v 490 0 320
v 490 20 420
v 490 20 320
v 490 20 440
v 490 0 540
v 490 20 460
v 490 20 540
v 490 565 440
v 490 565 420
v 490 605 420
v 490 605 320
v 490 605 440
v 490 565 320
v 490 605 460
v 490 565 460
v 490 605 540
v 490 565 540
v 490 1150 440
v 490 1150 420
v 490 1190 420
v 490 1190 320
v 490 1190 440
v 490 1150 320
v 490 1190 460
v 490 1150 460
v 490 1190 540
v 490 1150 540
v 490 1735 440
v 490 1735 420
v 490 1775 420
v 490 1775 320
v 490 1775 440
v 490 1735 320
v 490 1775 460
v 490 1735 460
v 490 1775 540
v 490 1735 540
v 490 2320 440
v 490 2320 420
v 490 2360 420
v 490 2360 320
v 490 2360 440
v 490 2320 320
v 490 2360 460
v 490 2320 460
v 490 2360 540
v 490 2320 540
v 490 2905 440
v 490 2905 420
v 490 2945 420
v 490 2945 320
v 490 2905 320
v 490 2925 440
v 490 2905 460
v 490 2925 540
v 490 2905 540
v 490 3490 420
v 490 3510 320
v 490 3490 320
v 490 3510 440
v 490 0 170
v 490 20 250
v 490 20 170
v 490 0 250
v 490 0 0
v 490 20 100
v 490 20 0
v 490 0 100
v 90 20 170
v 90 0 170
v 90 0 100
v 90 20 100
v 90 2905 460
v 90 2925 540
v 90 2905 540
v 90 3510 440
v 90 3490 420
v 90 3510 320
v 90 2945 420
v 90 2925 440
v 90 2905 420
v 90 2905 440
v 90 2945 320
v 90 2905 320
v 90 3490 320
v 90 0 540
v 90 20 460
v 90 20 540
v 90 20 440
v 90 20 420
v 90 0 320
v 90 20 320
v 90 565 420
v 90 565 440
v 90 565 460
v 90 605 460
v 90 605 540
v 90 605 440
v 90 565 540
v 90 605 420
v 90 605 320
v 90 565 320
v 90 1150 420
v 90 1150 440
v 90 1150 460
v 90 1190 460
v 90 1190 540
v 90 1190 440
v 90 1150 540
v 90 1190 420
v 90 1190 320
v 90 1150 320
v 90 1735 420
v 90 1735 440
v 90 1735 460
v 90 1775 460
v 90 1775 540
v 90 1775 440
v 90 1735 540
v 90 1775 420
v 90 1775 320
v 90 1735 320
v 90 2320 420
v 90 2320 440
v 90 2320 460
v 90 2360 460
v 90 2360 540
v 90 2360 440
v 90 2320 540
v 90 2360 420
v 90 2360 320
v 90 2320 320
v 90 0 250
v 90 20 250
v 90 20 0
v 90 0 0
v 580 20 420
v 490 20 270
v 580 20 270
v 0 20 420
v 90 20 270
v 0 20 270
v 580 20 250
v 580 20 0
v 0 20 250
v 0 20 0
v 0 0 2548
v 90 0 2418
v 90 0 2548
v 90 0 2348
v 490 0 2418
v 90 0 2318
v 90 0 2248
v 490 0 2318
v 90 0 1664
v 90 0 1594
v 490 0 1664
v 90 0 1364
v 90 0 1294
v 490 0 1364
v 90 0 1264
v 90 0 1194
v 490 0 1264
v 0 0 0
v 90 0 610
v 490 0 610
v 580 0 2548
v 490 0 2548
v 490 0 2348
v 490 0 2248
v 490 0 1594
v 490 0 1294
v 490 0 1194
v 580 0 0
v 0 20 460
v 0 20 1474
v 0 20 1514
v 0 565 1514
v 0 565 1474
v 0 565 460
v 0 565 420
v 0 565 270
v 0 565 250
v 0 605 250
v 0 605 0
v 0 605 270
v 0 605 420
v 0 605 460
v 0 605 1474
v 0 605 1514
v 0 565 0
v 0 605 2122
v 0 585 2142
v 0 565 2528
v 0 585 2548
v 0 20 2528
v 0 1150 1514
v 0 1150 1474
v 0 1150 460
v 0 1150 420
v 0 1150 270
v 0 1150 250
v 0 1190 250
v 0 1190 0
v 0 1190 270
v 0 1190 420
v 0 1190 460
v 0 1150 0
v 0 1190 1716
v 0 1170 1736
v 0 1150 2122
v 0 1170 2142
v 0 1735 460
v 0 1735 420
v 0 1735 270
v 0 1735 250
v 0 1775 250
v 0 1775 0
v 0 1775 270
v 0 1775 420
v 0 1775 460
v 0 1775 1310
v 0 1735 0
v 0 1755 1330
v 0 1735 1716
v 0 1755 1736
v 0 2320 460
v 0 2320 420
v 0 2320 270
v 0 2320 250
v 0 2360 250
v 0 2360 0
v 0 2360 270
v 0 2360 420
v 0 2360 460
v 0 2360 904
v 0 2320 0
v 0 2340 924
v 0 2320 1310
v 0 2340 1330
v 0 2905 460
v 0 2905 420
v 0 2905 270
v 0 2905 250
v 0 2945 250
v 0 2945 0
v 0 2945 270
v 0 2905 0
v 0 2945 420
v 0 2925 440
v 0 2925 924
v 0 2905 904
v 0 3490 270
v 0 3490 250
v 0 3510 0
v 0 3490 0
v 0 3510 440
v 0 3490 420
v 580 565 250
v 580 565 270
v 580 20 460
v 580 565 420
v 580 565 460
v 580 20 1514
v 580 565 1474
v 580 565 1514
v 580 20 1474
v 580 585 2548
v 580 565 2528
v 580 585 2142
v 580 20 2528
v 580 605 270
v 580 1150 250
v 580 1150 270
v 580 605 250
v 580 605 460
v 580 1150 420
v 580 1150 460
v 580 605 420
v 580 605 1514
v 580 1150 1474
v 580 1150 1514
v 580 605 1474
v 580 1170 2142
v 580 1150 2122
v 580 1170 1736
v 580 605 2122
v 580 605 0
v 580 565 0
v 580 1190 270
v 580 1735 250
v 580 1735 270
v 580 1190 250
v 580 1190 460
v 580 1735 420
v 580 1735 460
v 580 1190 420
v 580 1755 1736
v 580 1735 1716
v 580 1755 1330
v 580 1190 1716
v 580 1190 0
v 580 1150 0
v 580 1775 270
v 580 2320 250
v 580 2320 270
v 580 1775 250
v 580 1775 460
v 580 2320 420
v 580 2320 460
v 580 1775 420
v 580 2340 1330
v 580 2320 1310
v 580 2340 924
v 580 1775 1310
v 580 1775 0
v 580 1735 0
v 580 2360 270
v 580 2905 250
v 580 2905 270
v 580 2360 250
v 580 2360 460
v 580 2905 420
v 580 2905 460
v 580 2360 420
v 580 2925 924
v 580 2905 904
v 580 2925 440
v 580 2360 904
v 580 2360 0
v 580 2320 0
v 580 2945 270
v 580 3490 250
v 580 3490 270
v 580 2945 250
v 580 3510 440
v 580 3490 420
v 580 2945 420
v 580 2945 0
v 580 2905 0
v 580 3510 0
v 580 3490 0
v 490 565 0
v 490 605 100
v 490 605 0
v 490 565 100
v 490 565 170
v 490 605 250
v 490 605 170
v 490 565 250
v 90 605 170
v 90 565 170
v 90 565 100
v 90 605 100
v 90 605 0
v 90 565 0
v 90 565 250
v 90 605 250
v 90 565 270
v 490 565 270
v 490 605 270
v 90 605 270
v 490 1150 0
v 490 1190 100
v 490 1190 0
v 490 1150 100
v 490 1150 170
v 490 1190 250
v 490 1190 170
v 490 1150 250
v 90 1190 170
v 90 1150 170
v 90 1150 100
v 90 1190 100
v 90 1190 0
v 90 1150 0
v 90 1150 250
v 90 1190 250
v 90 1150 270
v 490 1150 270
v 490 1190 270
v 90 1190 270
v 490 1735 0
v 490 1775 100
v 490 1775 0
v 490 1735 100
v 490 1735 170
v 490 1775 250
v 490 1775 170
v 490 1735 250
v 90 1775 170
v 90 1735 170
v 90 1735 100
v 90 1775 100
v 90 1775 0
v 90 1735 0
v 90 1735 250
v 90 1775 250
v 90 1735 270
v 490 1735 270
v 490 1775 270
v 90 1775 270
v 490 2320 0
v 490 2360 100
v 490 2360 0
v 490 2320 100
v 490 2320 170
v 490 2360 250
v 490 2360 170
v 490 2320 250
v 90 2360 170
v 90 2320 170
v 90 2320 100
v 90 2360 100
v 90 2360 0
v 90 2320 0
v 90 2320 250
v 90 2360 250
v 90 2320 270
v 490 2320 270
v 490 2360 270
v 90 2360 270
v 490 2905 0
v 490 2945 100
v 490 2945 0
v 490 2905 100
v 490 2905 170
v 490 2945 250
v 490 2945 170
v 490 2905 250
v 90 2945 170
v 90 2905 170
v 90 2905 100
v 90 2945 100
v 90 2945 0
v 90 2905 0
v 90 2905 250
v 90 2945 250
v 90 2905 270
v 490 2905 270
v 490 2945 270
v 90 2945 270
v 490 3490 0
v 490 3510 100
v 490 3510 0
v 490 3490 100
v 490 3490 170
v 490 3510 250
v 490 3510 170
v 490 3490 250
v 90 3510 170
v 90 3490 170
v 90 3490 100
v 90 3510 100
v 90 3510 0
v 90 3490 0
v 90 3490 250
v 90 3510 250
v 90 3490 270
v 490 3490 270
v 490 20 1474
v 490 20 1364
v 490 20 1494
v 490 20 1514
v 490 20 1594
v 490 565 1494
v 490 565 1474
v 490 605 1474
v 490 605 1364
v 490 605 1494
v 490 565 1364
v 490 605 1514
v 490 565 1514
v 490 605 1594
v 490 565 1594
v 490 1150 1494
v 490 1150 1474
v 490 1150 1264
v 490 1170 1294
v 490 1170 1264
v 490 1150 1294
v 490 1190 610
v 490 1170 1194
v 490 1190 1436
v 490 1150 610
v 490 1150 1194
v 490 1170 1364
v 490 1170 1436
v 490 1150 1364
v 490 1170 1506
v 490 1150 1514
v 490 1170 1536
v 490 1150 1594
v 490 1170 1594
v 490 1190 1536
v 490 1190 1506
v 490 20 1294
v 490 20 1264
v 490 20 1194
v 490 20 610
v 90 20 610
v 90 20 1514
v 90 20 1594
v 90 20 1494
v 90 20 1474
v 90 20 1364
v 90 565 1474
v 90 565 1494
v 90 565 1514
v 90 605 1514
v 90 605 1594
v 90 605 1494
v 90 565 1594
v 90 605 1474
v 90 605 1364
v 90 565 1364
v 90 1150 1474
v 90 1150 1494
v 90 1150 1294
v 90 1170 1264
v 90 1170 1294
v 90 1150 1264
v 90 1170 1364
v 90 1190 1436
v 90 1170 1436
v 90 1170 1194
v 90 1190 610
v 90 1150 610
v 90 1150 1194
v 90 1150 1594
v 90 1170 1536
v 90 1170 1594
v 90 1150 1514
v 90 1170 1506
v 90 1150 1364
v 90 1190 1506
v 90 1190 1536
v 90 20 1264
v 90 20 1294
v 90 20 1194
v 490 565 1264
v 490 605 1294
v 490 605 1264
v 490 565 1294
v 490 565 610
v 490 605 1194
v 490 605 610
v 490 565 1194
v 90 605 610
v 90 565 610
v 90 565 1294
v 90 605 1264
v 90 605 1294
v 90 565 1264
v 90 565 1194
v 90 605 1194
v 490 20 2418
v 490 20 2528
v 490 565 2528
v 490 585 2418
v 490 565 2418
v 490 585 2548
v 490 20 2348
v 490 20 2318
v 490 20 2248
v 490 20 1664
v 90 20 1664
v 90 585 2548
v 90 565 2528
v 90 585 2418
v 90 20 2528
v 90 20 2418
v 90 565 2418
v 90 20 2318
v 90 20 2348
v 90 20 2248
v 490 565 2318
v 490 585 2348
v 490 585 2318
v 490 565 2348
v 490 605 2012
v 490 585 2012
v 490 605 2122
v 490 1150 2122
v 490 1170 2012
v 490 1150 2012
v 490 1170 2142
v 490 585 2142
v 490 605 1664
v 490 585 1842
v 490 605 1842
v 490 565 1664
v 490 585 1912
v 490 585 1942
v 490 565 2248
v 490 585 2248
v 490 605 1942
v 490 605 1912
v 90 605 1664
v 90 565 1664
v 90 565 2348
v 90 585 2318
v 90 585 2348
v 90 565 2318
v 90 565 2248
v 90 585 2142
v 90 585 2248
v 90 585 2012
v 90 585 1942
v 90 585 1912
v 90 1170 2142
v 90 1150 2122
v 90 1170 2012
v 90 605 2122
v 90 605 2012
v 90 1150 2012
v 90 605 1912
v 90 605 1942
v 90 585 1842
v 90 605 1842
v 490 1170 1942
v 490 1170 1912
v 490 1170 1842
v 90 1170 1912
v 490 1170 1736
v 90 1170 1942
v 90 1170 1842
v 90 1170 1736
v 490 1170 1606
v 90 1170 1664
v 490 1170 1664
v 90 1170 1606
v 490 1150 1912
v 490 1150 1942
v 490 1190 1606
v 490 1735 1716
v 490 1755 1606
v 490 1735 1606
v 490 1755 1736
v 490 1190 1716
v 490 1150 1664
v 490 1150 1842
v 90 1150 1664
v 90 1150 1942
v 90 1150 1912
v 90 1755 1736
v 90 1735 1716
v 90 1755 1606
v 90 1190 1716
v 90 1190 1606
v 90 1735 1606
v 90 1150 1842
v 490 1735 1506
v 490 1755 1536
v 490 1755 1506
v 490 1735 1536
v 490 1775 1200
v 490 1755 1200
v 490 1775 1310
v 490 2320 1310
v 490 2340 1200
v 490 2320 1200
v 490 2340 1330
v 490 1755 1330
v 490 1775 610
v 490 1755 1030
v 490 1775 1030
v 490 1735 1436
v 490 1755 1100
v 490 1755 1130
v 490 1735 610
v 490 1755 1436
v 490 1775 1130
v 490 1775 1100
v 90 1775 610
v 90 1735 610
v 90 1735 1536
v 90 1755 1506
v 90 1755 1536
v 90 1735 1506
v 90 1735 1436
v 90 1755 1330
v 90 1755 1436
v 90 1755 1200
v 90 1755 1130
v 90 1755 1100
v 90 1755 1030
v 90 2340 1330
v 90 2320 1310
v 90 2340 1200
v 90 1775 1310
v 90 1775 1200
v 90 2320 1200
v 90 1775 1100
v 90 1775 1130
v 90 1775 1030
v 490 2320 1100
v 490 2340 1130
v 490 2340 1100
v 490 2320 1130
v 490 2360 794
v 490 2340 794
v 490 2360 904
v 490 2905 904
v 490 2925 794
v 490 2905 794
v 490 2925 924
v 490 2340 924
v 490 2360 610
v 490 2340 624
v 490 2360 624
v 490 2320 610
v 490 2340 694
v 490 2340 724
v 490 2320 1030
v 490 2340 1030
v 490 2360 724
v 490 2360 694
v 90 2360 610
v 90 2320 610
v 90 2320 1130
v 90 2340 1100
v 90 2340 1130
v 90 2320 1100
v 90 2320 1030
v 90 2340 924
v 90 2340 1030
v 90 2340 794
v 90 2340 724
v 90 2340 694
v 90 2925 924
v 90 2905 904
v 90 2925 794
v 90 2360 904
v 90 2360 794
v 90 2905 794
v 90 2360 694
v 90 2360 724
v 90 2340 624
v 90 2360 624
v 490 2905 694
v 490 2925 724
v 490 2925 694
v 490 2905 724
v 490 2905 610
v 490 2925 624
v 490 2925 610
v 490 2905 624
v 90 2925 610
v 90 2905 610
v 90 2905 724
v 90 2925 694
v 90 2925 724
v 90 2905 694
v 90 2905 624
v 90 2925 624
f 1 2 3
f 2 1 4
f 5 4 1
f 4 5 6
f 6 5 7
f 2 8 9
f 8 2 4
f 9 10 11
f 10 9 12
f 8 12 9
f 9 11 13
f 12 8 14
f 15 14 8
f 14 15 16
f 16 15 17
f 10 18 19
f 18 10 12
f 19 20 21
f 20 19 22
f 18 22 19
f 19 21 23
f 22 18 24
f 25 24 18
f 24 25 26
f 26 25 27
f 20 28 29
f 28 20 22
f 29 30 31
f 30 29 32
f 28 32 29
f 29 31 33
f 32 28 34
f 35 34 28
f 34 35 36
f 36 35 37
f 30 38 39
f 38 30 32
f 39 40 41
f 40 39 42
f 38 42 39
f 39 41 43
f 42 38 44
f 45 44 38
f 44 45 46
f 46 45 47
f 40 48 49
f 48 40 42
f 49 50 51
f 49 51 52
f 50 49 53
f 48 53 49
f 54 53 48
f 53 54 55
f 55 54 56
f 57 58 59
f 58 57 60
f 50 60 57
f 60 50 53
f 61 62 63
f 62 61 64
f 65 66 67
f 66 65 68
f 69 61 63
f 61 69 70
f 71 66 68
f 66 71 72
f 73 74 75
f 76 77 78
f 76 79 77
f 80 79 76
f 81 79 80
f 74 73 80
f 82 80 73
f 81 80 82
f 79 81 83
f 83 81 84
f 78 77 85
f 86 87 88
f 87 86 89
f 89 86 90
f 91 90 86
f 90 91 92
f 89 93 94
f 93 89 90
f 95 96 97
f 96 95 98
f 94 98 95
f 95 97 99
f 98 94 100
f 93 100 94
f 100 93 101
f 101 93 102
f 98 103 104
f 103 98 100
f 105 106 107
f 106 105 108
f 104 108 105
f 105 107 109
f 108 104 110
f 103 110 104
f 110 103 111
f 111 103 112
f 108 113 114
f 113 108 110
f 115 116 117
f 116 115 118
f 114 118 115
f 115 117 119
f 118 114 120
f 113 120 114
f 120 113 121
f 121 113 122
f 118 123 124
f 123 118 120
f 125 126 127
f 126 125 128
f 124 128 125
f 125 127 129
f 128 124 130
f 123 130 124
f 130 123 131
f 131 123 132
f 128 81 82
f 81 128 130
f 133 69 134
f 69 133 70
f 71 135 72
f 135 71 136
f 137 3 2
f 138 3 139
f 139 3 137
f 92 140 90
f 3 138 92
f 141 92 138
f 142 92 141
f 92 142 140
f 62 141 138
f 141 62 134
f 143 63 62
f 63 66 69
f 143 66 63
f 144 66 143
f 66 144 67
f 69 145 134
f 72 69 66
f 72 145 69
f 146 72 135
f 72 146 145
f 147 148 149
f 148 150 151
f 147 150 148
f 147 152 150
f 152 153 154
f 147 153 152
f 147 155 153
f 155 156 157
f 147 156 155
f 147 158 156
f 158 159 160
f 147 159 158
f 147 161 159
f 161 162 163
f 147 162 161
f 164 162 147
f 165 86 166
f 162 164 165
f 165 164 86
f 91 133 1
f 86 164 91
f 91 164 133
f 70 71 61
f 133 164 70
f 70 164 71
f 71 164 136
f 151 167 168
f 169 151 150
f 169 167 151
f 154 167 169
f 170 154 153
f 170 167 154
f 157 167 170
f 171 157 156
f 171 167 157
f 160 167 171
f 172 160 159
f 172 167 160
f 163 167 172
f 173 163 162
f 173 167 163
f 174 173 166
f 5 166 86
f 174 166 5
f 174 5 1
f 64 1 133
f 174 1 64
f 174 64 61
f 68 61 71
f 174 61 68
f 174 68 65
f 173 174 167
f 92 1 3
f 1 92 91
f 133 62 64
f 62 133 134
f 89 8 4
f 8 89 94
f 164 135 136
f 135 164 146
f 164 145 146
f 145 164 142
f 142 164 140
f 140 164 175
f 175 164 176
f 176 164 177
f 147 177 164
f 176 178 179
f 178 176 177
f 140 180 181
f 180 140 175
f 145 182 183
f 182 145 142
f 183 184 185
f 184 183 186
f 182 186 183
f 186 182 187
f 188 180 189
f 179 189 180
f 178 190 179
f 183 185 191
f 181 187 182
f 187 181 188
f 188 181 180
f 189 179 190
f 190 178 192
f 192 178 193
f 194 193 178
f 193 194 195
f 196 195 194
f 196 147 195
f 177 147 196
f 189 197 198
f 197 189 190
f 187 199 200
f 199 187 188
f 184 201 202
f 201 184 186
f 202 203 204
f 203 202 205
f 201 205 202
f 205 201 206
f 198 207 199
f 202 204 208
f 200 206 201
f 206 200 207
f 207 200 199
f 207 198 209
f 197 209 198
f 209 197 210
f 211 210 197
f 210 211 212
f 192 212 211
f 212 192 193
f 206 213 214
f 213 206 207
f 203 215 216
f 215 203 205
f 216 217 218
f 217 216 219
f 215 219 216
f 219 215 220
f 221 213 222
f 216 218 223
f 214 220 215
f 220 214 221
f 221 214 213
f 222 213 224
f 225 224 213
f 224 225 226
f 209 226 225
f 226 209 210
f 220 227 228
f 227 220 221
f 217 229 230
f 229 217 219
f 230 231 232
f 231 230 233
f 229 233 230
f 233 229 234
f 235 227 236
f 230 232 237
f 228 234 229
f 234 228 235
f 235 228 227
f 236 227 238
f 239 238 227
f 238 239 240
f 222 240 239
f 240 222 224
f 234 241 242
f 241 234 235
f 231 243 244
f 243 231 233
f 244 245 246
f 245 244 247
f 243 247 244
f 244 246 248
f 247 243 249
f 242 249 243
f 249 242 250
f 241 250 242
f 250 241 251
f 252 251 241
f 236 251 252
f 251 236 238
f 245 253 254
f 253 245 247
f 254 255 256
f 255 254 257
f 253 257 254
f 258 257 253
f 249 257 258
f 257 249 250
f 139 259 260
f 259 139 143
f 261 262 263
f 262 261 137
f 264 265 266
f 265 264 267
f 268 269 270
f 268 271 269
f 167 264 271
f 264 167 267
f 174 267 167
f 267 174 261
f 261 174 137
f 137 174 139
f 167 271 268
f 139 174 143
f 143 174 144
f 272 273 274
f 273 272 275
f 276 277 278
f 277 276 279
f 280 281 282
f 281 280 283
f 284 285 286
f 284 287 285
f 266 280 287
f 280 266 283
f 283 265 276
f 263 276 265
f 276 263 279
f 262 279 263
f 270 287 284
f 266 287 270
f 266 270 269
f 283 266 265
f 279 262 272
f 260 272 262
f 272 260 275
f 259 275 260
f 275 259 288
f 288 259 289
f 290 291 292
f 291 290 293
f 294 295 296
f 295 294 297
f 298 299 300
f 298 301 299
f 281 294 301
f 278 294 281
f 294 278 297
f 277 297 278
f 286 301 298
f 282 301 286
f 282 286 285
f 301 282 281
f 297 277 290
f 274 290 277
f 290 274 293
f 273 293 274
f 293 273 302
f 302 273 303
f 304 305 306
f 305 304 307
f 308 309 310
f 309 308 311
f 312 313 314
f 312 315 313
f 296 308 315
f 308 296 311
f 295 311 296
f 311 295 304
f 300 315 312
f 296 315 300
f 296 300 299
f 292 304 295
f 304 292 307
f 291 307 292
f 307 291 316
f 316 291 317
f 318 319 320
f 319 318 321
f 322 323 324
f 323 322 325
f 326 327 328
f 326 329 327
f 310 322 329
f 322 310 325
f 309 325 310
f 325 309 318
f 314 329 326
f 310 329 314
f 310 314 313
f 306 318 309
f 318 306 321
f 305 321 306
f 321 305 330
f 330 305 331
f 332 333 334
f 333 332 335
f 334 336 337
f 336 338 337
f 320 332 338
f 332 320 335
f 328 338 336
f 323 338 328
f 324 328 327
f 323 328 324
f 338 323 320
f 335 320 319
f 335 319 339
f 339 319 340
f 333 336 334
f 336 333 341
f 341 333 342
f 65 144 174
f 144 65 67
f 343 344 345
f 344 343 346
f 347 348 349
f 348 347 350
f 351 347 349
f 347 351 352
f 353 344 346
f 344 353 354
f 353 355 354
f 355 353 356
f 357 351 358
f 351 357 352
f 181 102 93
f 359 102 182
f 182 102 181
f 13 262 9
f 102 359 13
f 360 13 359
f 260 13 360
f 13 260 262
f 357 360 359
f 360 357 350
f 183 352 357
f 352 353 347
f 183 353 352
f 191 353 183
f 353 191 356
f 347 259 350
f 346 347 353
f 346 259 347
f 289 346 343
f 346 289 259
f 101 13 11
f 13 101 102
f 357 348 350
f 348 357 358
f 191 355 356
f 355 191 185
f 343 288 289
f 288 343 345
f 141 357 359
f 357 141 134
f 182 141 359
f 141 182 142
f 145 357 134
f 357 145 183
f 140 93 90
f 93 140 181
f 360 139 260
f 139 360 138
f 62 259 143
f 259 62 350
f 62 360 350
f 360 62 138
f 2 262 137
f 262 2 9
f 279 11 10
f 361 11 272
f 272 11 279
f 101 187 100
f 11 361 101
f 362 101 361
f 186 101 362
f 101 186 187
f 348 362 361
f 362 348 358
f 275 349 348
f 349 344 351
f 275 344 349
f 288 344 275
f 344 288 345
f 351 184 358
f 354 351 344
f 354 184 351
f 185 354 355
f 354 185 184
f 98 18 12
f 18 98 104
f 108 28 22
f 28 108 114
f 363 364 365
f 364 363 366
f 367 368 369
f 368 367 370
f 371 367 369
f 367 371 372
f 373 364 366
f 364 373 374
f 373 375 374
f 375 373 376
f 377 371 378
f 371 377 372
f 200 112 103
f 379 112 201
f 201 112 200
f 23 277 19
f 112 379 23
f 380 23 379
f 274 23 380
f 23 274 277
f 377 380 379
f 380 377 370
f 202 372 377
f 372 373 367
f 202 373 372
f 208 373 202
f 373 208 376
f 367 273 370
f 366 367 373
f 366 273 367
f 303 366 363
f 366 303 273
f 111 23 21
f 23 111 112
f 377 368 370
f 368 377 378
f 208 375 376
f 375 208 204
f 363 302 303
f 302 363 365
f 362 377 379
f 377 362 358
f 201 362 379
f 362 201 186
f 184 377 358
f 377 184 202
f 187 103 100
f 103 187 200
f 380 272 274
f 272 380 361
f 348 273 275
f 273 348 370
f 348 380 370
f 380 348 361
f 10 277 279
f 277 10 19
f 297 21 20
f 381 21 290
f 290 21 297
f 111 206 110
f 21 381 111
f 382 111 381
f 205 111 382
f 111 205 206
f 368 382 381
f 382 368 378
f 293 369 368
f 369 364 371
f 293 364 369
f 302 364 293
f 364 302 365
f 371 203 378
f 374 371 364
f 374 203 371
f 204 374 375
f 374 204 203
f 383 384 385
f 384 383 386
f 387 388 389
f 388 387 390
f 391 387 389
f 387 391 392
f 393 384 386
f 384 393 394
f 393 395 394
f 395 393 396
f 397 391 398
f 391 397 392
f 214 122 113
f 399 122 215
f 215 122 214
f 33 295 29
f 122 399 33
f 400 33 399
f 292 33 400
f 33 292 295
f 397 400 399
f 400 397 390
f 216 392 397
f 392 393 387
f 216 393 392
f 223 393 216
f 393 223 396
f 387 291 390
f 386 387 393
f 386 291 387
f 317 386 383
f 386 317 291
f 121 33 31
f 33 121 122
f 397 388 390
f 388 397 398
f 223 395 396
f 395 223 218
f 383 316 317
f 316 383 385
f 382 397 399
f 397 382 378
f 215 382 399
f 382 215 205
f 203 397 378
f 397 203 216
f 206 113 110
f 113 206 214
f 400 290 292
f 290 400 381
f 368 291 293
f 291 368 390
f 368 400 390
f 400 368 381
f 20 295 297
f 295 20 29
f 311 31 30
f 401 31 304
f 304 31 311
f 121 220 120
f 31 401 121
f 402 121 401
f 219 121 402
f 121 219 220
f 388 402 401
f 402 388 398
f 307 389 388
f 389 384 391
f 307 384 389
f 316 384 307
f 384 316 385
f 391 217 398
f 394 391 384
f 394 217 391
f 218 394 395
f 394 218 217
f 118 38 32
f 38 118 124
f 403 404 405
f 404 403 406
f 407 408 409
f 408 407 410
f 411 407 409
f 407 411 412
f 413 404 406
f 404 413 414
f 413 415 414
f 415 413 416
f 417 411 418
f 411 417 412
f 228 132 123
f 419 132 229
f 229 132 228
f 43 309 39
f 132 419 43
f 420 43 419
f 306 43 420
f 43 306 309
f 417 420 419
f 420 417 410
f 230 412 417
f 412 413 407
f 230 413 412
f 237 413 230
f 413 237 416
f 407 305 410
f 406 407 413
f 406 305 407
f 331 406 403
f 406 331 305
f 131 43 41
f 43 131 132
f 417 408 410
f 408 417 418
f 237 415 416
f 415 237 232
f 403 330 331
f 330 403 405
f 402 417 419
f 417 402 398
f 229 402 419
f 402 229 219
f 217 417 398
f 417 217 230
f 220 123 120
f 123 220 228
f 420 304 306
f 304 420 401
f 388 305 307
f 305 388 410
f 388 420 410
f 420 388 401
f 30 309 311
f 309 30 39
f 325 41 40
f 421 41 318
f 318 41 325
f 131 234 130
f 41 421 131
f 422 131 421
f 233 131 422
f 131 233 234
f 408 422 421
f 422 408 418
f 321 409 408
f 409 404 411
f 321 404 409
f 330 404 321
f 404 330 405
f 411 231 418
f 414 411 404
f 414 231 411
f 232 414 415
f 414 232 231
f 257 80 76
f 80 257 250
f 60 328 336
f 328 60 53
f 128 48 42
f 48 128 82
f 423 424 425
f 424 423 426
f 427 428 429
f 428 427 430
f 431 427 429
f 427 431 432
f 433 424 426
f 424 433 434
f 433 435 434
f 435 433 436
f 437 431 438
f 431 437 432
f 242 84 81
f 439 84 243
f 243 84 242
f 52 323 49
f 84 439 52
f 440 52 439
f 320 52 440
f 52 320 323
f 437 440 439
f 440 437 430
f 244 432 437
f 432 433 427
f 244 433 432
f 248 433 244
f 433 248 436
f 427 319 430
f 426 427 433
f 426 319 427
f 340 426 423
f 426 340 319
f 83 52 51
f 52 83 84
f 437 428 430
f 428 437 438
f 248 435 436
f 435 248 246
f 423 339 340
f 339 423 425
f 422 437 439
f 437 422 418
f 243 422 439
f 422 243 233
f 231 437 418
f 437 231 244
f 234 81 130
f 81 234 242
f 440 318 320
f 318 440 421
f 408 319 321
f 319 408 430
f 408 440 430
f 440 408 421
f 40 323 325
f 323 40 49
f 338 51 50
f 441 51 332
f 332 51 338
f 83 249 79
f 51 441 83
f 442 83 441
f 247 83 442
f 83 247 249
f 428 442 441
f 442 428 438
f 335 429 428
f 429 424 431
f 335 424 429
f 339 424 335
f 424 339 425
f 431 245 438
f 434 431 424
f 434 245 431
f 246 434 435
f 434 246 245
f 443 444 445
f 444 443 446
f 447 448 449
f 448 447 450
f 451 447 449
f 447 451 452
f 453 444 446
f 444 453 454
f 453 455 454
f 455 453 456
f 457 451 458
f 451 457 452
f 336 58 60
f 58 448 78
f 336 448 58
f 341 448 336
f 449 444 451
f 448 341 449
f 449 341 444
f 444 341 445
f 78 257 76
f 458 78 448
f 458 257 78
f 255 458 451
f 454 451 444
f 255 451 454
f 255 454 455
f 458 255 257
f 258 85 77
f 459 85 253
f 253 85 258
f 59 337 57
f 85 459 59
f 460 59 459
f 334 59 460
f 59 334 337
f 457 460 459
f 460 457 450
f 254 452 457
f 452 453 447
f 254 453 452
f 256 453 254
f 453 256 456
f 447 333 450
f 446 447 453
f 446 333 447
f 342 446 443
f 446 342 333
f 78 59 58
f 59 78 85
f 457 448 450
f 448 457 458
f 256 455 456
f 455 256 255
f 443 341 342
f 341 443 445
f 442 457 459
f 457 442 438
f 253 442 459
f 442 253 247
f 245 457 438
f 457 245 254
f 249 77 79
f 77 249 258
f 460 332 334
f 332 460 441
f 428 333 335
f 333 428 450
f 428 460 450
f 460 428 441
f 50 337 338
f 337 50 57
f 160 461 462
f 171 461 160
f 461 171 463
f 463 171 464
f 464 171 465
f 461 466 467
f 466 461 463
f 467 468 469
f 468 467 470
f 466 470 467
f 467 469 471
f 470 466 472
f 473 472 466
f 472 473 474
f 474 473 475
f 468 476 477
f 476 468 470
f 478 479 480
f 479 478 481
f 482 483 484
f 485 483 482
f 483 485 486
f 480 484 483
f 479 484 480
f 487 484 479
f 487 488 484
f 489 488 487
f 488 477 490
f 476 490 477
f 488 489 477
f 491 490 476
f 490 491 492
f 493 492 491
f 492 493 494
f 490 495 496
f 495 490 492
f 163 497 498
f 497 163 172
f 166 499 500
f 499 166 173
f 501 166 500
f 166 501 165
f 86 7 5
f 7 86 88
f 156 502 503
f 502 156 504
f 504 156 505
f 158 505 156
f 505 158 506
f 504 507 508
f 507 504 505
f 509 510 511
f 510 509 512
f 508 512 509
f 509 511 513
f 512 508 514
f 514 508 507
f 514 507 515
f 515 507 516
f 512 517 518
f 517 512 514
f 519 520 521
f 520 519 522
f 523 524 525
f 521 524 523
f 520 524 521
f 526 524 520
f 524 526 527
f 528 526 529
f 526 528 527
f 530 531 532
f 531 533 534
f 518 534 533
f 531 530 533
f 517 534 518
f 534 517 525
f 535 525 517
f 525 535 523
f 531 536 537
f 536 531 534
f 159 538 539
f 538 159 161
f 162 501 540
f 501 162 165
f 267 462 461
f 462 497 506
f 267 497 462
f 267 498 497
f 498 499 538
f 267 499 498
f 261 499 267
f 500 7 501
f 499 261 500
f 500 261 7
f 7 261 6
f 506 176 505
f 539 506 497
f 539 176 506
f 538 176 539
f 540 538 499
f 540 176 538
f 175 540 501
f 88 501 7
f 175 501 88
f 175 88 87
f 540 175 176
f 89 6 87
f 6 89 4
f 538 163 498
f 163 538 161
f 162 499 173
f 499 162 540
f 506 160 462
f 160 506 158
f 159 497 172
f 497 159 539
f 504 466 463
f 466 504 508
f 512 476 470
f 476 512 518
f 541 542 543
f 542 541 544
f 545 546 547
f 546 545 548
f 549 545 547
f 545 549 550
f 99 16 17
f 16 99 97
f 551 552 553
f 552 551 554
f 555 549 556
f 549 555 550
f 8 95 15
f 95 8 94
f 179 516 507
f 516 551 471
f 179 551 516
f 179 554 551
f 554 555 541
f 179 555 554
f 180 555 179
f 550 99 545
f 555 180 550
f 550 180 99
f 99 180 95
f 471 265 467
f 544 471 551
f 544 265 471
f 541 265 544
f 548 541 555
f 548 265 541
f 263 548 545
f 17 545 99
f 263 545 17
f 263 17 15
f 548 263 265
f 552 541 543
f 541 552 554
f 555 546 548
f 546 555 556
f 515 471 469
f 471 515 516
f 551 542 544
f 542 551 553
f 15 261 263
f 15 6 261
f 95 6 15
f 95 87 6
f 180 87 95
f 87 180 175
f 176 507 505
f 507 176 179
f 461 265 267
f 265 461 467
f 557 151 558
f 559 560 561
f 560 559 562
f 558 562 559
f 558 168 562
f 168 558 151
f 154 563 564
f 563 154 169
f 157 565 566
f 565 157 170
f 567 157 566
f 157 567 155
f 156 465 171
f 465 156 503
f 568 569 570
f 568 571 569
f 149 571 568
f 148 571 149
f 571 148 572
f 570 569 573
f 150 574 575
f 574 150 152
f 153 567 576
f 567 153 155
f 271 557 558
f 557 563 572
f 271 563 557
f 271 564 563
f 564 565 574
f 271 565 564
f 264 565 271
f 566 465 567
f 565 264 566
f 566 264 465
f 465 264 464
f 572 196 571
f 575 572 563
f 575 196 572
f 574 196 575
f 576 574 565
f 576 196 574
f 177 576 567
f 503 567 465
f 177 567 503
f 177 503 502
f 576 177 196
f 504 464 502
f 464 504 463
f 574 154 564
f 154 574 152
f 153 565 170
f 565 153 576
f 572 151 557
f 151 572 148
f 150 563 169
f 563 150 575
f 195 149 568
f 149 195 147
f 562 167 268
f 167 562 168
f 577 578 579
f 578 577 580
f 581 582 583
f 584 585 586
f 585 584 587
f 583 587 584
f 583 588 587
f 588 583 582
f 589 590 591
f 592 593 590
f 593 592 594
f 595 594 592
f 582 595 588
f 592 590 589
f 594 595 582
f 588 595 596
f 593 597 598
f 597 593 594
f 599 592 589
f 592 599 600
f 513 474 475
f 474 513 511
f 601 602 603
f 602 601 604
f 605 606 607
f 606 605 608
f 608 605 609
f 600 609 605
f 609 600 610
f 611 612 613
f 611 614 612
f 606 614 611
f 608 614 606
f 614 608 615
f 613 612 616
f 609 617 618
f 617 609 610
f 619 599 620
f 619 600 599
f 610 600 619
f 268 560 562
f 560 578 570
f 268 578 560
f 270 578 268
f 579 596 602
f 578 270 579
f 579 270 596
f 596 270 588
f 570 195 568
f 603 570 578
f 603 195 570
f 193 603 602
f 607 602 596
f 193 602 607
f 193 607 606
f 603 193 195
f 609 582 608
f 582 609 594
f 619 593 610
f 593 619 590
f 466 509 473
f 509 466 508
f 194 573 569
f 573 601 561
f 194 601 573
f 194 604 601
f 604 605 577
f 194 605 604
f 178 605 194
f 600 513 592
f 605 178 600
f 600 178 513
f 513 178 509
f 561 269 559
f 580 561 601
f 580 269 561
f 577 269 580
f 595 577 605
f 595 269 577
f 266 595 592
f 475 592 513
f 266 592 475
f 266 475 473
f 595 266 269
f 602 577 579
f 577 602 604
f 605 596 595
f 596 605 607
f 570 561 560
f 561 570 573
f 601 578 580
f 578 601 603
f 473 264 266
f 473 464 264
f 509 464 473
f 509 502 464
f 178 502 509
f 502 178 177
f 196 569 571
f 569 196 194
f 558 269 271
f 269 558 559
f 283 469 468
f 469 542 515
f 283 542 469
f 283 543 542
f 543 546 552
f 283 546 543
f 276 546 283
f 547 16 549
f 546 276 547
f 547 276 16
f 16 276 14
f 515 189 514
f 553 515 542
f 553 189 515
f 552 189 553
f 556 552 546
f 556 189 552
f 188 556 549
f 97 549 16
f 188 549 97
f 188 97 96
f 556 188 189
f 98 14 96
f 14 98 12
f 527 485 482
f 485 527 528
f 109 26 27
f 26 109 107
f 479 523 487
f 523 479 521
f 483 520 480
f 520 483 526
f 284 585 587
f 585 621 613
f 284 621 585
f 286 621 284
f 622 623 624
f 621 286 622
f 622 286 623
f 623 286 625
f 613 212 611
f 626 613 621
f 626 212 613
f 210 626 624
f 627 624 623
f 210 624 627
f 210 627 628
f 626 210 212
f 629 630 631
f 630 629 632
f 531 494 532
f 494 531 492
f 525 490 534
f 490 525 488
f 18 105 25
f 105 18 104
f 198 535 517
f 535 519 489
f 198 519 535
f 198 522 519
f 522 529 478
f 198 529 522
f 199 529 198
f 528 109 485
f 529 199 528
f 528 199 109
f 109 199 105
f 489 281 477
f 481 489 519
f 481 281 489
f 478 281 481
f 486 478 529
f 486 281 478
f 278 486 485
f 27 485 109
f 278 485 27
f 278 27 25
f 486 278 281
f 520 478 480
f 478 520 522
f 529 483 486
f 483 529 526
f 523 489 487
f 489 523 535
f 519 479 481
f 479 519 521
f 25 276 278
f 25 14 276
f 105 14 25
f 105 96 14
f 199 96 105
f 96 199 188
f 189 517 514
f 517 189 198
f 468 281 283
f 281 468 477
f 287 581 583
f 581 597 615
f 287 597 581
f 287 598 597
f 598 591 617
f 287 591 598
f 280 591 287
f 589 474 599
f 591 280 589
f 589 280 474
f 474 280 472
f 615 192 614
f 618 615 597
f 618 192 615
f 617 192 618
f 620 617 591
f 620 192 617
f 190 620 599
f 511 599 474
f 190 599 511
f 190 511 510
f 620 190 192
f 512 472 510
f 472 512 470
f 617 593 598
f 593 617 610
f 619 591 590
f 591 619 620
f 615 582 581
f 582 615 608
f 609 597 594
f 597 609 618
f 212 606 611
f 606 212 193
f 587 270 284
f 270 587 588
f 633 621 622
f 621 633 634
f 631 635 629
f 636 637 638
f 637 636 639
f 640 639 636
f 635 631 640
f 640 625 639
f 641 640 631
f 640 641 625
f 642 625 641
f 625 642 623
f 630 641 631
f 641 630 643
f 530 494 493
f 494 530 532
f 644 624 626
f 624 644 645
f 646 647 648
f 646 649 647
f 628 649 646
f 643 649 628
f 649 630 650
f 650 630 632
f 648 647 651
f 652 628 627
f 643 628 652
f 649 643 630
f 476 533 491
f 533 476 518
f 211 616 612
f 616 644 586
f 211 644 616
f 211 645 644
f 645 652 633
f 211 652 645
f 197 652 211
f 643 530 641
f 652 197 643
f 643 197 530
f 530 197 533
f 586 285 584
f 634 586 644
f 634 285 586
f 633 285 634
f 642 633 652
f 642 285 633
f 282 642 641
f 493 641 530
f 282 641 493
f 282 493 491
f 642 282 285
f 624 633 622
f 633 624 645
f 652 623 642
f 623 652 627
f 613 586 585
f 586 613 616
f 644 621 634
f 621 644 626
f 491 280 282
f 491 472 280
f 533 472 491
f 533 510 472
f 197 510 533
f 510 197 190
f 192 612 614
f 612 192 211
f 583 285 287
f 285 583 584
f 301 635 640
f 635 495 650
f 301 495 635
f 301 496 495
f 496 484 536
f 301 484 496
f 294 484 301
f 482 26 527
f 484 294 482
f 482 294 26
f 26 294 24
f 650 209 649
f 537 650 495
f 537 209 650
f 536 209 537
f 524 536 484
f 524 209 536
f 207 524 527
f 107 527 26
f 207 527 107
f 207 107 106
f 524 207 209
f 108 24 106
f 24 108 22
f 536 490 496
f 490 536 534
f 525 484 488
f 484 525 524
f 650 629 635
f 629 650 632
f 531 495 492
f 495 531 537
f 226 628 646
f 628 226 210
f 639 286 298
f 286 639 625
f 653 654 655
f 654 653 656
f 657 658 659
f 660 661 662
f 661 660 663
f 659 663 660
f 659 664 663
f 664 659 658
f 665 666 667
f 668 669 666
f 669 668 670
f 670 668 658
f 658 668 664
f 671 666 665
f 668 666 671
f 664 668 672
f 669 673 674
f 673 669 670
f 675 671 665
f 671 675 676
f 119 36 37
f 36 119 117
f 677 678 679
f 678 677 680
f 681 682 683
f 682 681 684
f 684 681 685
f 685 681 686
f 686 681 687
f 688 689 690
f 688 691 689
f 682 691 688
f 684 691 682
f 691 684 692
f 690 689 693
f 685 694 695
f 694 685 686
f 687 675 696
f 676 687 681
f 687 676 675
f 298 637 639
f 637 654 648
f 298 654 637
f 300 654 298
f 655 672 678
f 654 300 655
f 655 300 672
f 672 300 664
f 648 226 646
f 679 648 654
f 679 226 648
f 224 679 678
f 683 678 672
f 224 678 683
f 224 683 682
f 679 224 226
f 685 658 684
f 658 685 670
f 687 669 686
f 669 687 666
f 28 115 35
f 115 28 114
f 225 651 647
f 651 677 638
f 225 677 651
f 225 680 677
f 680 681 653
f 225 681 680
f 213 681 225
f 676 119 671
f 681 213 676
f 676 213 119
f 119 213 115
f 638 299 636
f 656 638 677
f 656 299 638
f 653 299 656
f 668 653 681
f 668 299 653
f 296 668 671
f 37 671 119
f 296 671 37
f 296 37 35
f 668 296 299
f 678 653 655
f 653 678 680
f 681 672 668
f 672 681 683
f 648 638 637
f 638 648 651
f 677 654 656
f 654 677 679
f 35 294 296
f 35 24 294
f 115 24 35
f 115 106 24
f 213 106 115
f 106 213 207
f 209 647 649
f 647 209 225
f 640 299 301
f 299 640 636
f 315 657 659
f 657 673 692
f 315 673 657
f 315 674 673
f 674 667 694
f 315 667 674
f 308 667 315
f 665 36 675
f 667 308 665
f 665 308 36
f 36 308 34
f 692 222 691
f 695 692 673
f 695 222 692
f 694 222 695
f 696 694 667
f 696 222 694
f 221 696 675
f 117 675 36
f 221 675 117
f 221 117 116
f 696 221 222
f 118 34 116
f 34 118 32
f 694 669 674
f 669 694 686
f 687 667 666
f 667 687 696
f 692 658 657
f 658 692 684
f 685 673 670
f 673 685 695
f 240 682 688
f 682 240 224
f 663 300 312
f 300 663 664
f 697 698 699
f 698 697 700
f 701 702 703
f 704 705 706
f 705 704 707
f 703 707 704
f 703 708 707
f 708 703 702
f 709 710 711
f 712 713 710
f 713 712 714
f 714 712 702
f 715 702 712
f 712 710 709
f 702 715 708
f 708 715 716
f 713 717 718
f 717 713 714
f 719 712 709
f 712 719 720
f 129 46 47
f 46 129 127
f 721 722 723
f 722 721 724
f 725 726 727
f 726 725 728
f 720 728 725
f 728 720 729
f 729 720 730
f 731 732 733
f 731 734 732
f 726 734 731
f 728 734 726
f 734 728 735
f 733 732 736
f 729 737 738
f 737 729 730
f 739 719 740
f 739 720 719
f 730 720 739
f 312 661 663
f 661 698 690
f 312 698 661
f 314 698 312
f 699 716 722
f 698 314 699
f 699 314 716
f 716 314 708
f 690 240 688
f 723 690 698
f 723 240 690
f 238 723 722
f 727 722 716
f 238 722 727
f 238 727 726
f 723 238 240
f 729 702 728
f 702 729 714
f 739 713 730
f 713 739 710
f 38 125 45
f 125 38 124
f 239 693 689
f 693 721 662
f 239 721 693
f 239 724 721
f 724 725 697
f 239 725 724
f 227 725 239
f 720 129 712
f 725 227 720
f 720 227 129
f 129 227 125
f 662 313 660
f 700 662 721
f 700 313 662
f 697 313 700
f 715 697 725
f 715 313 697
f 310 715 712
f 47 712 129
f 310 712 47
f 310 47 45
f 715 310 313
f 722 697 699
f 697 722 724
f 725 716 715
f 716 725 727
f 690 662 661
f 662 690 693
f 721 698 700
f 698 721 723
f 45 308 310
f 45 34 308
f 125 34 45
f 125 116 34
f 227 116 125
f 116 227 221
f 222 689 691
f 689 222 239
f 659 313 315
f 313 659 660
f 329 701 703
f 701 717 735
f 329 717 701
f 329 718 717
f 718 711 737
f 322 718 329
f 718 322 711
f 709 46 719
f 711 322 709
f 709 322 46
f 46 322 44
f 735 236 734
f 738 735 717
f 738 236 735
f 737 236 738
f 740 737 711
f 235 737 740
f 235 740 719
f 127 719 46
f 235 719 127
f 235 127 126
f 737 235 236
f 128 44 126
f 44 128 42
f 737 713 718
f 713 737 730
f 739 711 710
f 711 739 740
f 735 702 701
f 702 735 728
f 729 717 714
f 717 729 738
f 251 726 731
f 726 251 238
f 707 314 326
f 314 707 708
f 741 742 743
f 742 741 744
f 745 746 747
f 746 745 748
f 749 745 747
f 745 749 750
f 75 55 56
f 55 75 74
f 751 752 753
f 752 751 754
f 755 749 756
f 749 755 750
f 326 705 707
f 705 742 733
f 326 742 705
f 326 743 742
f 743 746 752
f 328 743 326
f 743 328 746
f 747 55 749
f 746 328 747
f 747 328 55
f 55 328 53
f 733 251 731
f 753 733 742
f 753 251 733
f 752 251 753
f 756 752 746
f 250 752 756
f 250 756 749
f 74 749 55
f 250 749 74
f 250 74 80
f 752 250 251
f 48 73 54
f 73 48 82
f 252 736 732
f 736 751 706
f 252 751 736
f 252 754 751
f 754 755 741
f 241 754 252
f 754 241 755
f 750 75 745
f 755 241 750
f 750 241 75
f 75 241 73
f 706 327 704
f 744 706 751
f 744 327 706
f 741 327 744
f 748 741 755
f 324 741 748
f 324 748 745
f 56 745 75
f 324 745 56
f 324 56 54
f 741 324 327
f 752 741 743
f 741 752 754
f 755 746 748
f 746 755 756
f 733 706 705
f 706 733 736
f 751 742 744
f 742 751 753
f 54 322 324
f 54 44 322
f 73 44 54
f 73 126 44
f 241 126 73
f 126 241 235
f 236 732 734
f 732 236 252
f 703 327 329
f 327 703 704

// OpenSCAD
lacznik_d = 400;
lacznik_w = 70;
y = 20;
box = 585 - 20;


module wall(height, joints) {
    color("white") {
                                        cube([90,y,height]);
        translate([90+lacznik_d, 0, 0]) cube([90,y,height]);
        
        for (a = joints) {
            translate([90, 0, a]) cube([lacznik_d,y,lacznik_w]);
        }
        
    }
}

module drawerBox(width = box) {
    height = 440;
                             wall(height, [100, 250]);
    translate([0, width, 0]) wall(height, [100, 250]);
    
    translate([0, y, 250])
    cube([90, box-20, y]);
    
    translate([0, y, height-y])
    cube([90, box-20, y]);
    
    translate([lacznik_d+90, y, 250])
    cube([90, box-20, y]);
    
    translate([lacznik_d+90, y, height-y])
    cube([90, box-20, y]);
}

module hangBox(height, width = box) {
                                wall(height, [100, height-300, height-200]);
    translate ([0, width, 0])   wall(height, [100, height-300, height-200]);
    
    color("white")
    translate([0, y, 0])                    cube([400+90+90, box-20, y]);
    translate([0, y, height-y])             cube([90, box-20, y]);
    translate([lacznik_d+90, y, height-y])  cube([90, box-20, y]);
}

                                drawerBox();
translate ([0, (box+y), 0])     drawerBox();
translate ([0, (box+y)*2, 0])   drawerBox();
translate ([0, (box+y)*3, 0])   drawerBox();
translate ([0, (box+y)*4, 0])   drawerBox();
translate ([0, (box+y)*5, 0])   drawerBox();

translate ([0, 0, 440])         hangBox(1054, box);
translate ([0, 0, 440+1054])    hangBox(1054, box);

translate ([0, (box+y), 440])   hangBox(1054, box);
translate ([0, (box+y), 440+1054])   hangBox(1054-406, box);

translate ([0, (box+y)*2, 440])   hangBox(1054*2-406*2, box);

translate ([0, (box+y)*3, 440])   hangBox(1054*2-406*3, box);

translate ([0, (box+y)*4, 440])   hangBox(1054*2-406*4, box);
